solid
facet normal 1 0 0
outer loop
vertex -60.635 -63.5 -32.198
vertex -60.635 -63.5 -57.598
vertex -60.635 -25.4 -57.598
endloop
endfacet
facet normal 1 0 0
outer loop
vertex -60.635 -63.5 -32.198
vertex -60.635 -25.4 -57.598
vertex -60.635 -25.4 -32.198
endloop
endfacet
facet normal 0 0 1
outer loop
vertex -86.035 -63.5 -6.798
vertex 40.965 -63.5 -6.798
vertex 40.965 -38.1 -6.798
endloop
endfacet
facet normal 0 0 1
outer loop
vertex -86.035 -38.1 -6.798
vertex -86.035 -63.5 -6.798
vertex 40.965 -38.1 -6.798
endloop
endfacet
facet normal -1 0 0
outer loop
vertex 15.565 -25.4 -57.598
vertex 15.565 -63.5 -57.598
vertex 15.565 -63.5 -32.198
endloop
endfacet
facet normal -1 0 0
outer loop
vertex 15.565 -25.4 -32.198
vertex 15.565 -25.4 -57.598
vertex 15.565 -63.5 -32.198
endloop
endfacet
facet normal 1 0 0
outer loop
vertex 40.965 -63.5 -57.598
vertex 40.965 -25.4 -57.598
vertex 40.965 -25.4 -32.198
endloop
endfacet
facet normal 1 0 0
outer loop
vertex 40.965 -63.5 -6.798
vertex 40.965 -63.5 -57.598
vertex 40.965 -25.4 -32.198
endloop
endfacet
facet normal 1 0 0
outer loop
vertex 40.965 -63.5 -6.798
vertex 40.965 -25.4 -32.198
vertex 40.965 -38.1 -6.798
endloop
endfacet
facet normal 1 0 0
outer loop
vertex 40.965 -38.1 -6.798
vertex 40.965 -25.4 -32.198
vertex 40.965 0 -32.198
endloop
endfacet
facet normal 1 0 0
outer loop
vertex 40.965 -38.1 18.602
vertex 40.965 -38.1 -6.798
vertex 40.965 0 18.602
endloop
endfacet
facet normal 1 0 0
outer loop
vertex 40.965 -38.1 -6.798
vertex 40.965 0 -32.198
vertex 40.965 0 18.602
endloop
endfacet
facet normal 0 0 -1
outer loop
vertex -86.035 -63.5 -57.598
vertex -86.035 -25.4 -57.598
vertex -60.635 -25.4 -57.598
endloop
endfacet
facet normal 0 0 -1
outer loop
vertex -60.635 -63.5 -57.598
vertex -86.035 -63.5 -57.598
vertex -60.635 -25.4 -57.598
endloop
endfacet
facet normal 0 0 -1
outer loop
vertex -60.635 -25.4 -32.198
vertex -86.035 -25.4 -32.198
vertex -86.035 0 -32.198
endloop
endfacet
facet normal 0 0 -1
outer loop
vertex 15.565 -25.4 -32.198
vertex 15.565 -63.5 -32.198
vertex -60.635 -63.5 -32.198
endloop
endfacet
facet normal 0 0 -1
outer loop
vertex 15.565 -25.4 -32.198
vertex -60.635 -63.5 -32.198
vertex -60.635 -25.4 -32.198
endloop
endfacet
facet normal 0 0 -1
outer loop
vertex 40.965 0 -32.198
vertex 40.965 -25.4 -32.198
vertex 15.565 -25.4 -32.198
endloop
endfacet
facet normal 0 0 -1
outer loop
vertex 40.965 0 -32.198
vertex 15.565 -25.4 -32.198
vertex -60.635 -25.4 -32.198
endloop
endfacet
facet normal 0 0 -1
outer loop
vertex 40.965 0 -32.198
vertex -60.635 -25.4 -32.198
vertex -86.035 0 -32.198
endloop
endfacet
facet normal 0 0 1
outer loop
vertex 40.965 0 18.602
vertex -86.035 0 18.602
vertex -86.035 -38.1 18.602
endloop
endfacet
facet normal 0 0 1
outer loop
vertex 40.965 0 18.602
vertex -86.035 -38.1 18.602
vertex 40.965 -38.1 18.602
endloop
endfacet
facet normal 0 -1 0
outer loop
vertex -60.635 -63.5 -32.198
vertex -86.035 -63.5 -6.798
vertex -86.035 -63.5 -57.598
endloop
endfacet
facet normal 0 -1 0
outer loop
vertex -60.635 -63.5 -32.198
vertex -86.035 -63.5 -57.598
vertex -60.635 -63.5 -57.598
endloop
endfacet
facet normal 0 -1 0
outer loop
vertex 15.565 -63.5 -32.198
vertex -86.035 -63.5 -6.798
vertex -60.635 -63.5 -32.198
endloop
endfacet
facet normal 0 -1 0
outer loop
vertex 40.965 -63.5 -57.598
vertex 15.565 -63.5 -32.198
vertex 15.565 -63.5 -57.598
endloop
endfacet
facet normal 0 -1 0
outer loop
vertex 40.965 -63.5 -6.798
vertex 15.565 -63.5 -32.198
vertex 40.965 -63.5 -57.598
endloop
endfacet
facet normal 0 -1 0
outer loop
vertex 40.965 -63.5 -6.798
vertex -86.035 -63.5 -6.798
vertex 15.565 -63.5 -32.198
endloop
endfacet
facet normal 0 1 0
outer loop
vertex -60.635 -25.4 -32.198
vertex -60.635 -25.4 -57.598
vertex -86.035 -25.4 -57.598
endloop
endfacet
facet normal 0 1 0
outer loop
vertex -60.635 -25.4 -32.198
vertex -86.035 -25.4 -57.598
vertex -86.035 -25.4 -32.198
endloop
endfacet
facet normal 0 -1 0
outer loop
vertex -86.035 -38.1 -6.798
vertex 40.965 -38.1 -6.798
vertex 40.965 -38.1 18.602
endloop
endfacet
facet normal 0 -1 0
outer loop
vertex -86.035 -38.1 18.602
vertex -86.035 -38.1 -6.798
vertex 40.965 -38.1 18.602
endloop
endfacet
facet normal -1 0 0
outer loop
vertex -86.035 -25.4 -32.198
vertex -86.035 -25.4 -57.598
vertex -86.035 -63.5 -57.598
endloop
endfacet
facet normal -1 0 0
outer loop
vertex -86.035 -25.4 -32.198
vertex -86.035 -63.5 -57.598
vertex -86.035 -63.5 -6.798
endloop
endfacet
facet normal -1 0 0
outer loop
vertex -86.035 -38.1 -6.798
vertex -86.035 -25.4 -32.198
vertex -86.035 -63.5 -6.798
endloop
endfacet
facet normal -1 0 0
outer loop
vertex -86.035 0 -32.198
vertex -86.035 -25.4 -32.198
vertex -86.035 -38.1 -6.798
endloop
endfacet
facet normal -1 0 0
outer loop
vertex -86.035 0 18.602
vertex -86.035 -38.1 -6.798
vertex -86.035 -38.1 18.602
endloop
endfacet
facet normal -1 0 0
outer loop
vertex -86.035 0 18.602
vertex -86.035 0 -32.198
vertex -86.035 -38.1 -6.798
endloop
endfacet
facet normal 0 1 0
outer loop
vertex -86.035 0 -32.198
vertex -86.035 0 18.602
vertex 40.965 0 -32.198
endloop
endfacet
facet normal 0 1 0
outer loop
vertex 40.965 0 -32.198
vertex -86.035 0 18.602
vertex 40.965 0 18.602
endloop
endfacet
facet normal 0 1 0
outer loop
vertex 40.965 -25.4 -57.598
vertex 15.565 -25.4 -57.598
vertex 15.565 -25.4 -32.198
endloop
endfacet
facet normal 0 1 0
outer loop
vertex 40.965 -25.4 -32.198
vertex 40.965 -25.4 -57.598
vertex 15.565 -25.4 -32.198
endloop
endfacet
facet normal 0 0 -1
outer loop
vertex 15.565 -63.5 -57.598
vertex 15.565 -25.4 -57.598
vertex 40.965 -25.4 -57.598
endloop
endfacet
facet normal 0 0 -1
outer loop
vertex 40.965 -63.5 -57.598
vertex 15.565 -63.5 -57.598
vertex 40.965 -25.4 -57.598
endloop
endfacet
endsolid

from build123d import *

# Parameters (mm, degrees)
F0_W     = 127
F0_H     = 76.2
F1_DEPTH = 63.5
F2_W     = 76.2
F2_H     = 25.4
F3_DEPTH = 63.501
F4_W     = 25.4
F4_H     = 25.4
F5_DEPTH = 127.001


with BuildPart() as f1:
    # F0 (on Front) → F1 (new body)
    with BuildSketch(Plane.XZ):
        with Locations((-22.534849, -19.497559)):
            Rectangle(F0_W, F0_H)
    extrude(amount=F1_DEPTH)

    # F2 (on face) → F3 (cut, through all)
    with BuildSketch(Plane.XZ.offset(63.5)):
        with Locations((-22.534849, -44.897559)):
            Rectangle(F2_W, F2_H)
    extrude(amount=-F3_DEPTH, mode=Mode.SUBTRACT)

    # F4 (on face) → F5 (cut, through all)
    with BuildSketch(Plane.YZ.offset(40.965151)):
        with Locations((-12.7, -44.897559)):
            Rectangle(F4_W, F4_H)
        with Locations((-50.8, 5.902441)):
            Rectangle(F4_W, F4_H)
    extrude(amount=-F5_DEPTH, mode=Mode.SUBTRACT)


solid = f1.part
